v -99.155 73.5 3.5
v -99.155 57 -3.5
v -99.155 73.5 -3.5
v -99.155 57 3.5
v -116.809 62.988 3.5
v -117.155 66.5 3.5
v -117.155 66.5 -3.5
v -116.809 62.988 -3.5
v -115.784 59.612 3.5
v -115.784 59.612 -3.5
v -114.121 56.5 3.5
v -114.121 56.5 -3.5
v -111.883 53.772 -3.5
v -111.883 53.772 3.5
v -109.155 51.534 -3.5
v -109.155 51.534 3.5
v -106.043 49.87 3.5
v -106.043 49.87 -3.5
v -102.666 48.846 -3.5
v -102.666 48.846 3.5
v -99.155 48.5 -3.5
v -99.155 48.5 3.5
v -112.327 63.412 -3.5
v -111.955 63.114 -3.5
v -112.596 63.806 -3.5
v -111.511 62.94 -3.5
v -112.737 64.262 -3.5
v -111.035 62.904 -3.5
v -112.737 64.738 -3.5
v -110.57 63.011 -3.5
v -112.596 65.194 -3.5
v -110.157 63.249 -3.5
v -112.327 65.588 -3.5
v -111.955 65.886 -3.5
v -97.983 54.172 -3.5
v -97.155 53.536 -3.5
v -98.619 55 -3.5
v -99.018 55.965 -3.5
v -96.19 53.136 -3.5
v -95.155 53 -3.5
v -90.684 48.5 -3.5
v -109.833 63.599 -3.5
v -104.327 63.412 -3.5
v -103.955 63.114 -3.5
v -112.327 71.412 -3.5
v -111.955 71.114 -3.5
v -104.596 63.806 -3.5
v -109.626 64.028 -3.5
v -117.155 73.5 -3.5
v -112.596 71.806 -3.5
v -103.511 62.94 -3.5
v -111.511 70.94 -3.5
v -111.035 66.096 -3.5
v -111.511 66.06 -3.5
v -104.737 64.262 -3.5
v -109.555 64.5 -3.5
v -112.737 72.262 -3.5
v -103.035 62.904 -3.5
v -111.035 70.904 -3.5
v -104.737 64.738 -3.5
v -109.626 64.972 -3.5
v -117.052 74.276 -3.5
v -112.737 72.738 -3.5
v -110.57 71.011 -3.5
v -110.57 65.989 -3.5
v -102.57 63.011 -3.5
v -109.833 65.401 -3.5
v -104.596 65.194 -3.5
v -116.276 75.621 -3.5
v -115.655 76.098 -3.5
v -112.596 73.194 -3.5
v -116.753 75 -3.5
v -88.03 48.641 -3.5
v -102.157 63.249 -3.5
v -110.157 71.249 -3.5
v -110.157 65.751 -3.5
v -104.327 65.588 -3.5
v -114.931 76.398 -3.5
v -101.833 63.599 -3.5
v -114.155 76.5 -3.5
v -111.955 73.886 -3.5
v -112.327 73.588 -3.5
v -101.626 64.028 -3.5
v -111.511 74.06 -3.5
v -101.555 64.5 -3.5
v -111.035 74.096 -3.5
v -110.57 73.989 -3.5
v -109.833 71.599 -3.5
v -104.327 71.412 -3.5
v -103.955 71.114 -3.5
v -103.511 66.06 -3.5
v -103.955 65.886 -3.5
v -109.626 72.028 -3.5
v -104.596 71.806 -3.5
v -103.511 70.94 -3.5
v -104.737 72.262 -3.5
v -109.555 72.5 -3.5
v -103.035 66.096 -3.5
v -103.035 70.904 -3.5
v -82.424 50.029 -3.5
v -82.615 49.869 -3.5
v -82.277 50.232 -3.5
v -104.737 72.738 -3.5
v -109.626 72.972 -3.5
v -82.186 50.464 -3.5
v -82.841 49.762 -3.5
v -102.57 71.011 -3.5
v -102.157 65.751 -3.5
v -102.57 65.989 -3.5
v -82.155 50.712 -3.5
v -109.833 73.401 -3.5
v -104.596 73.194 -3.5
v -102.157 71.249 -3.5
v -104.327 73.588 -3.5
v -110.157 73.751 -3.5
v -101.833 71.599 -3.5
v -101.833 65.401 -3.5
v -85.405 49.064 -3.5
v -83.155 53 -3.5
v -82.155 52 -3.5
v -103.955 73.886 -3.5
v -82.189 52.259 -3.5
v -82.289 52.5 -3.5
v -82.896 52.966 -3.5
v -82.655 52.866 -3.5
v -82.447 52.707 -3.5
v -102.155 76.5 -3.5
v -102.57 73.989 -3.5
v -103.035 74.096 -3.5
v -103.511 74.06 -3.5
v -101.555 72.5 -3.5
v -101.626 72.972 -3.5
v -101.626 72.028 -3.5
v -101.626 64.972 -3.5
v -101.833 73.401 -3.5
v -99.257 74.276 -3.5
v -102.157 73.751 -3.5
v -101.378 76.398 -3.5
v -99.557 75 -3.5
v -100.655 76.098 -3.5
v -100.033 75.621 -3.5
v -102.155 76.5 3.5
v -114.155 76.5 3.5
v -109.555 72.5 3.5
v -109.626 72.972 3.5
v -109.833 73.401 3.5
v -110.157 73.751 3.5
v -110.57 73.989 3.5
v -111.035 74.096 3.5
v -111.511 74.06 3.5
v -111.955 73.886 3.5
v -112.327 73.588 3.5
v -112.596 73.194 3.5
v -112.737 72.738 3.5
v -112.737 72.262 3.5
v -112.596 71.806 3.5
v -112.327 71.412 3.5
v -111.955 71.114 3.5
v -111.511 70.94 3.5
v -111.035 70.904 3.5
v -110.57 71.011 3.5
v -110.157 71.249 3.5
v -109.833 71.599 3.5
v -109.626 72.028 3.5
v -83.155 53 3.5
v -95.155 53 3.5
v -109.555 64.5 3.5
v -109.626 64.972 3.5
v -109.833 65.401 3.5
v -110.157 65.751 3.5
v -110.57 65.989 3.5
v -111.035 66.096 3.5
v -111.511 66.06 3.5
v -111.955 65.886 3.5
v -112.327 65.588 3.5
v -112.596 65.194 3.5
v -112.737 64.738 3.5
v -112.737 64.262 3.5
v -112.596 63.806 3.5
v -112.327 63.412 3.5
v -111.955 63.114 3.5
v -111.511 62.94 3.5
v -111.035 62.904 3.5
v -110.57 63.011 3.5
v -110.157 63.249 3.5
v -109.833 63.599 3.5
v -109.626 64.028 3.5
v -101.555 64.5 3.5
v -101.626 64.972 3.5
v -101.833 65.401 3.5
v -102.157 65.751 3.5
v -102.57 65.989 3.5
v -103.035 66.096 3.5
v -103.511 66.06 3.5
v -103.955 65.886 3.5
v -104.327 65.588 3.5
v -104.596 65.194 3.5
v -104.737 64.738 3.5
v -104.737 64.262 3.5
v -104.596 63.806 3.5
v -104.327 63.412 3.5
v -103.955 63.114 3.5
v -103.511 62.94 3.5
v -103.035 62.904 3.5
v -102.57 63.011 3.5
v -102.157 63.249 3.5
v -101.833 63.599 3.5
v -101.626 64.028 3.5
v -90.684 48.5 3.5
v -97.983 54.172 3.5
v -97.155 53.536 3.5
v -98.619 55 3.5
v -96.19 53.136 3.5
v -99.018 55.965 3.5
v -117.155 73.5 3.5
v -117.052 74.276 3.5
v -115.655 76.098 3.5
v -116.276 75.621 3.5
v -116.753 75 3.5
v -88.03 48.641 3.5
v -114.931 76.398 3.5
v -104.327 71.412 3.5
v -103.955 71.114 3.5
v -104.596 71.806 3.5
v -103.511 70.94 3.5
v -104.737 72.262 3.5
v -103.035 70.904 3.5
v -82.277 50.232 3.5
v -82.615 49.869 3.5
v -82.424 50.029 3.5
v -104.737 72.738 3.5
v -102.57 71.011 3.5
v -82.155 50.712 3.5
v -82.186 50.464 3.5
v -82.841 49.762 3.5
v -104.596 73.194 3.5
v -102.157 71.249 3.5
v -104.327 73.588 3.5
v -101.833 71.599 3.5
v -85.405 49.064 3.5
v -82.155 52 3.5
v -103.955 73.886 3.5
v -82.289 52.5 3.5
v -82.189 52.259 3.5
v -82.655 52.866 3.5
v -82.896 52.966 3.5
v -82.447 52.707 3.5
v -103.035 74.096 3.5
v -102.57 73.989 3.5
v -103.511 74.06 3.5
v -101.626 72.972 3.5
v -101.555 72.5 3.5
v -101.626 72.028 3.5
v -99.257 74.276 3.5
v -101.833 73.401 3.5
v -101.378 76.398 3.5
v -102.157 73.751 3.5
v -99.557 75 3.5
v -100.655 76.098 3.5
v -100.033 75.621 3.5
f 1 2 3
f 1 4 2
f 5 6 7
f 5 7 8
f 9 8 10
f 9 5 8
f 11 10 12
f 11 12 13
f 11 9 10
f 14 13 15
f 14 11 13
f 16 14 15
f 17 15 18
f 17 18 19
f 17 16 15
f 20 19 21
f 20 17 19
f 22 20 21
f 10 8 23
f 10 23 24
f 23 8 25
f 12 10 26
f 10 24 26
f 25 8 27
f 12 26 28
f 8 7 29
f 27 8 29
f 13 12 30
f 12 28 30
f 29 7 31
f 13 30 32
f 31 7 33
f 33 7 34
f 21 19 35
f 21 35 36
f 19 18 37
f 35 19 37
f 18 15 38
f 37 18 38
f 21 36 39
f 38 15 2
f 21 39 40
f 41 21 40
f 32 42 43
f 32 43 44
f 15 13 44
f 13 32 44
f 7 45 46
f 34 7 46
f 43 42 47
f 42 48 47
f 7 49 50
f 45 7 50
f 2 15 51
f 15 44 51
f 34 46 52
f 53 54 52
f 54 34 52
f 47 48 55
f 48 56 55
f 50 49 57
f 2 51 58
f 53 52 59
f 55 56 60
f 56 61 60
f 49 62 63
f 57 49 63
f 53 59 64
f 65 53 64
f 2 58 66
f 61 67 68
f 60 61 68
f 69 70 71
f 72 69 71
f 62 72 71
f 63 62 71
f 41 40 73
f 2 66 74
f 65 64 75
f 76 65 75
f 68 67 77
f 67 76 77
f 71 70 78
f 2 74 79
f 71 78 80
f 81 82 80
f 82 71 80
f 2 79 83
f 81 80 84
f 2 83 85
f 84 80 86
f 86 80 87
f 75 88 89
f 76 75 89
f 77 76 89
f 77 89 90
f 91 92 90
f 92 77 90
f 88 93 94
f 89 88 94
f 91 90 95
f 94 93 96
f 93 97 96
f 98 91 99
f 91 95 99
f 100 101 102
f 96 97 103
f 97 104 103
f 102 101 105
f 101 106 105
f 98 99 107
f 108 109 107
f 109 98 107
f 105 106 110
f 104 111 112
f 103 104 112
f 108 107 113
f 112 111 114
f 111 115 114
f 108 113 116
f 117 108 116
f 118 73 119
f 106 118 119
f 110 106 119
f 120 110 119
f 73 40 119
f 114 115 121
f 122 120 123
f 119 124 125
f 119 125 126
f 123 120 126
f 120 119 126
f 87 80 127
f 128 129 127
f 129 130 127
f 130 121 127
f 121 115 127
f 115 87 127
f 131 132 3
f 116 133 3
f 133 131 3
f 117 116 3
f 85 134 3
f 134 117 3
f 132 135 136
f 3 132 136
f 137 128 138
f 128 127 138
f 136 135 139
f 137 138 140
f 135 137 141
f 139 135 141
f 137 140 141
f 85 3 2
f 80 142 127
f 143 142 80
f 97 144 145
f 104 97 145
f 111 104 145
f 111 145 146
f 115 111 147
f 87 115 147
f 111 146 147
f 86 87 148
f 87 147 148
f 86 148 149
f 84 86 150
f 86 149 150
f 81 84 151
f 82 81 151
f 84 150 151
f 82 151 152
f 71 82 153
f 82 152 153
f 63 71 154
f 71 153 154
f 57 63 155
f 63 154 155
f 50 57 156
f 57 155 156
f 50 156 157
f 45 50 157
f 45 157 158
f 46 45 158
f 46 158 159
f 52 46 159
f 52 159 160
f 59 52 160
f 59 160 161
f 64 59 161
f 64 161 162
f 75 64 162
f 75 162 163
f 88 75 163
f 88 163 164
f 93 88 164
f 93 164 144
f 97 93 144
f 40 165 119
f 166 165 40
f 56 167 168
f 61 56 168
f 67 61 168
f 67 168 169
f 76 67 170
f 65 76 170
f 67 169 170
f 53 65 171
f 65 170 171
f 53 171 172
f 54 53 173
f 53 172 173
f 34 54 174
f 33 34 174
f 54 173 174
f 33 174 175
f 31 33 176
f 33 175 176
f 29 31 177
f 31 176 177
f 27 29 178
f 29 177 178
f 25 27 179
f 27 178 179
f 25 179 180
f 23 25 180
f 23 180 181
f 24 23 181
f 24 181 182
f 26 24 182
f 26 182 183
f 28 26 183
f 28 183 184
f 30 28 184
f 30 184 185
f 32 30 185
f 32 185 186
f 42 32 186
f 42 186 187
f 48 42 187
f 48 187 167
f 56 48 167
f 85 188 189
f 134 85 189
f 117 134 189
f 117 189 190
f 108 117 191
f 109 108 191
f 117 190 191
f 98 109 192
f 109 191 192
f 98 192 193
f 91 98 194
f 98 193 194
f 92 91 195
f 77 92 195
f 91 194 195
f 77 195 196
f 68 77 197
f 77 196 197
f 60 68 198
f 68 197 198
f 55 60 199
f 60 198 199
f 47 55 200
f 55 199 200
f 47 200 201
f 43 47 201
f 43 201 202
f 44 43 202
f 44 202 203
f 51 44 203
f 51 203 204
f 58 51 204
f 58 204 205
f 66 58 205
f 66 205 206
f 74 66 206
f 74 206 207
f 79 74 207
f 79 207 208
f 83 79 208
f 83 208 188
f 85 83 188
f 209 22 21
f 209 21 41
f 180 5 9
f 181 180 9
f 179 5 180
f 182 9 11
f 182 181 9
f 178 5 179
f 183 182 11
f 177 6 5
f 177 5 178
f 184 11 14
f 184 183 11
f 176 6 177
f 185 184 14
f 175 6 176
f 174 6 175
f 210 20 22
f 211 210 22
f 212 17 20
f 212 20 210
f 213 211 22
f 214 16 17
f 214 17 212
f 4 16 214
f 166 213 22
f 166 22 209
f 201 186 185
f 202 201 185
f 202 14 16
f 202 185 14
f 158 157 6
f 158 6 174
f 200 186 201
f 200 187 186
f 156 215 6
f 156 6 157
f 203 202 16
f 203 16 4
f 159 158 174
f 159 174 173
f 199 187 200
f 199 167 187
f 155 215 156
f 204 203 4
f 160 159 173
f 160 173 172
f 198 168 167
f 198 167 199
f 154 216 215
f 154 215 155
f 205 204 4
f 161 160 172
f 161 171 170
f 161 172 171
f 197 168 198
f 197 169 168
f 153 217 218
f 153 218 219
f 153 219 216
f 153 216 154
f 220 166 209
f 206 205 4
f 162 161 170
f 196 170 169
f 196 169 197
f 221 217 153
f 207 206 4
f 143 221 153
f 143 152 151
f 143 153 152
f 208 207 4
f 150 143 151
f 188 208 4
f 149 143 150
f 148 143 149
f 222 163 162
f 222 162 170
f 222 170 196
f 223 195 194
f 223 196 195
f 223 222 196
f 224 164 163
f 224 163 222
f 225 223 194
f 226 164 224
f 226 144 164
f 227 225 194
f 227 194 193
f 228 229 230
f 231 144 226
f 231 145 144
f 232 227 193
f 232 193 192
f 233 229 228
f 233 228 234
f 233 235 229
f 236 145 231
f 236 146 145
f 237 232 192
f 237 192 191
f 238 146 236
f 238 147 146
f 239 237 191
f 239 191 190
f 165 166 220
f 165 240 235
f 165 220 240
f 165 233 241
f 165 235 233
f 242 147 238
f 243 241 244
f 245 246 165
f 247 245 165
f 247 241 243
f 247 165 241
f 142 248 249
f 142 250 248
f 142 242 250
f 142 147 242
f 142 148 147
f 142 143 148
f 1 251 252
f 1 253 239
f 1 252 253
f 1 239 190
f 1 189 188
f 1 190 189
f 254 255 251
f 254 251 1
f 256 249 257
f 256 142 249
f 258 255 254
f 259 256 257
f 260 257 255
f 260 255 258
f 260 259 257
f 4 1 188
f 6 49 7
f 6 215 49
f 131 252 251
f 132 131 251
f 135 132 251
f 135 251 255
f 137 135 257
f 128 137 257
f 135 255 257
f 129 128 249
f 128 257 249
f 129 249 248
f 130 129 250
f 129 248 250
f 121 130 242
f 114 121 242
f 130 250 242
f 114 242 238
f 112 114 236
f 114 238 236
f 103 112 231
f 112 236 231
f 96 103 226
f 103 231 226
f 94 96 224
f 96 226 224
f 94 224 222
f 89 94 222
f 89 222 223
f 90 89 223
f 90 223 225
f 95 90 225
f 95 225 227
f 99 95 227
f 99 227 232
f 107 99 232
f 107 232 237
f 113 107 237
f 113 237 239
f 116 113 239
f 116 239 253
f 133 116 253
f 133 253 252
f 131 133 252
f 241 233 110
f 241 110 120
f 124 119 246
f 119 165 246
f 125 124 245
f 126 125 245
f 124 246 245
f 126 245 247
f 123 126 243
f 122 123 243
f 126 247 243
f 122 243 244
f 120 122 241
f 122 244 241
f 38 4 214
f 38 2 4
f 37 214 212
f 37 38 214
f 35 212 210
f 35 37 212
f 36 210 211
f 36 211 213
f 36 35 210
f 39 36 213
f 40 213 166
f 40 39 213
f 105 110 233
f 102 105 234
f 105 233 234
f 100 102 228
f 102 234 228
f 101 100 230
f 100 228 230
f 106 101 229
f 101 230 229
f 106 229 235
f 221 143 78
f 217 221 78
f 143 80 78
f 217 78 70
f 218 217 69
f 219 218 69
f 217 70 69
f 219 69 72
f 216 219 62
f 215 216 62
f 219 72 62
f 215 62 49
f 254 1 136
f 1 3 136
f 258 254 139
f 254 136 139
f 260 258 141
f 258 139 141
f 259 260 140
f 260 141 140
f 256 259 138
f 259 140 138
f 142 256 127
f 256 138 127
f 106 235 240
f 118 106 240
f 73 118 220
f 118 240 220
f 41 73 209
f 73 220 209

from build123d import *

# Parameters (mm, degrees)
EXTRUDE_1_DEPTH     = 3.5
SKETCH_3_R          = 1.6
CUT_EXTRUDE_1_DEPTH = 16
CUT_EXTRUDE_2_DEPTH = 13
FILLET_1_R          = 1
FILLET_2_R          = 3
FILLET_3_R          = 4


with BuildPart() as part:
    # 草图2 → 凸台-拉伸1 (new, symmetric)
    with BuildSketch(Plane.XY):
        with BuildLine():
            Line((-117.154590294, 76.5), (-117.154590294, 66.5))
            ThreePointArc((-117.154590294, 66.5), (-111.882512356, 53.772077939), (-99.154590294, 48.5))
            Line((-99.154590294, 48.5), (-82.154590294, 48.5))
            Line((-82.154590294, 48.5), (-82.154590294, 53))
            Line((-82.154590294, 53), (-99.154590294, 53))
            Line((-99.154590294, 53), (-99.154590294, 76.5))
            Line((-99.154590294, 76.5), (-117.154590294, 76.5))
        make_face()
    extrude(amount=EXTRUDE_1_DEPTH, both=True)

    # 草图3 → 切除-拉伸1 (cut)
    with BuildSketch(Plane.XY.offset(3.5)):
        with Locations((-103.154590294, 72.5)):
            Circle(SKETCH_3_R)
        with Locations((-111.154590294, 72.5)):
            Circle(SKETCH_3_R)
        with Locations((-111.154590294, 64.5)):
            Circle(SKETCH_3_R)
        with Locations((-103.154590294, 64.5)):
            Circle(SKETCH_3_R)
    extrude(amount=-CUT_EXTRUDE_1_DEPTH, mode=Mode.SUBTRACT)

    # 草图4 → 切除-拉伸2 (cut)
    with BuildSketch(Plane.XY.offset(3.5)):
        with BuildLine():
            Line((-90.683951349, 48.5), (-90.683951349, 46.627419574))
            Line((-90.683951349, 46.627419574), (-65.683951349, 46.627419574))
            Line((-65.683951349, 46.627419574), (-65.683951349, 73.5))
            ThreePointArc((-65.683951349, 73.5), (-73.006281819, 55.82233047), (-90.683951349, 48.5))
        make_face()
    extrude(amount=-CUT_EXTRUDE_2_DEPTH, mode=Mode.SUBTRACT)

    # 圆角1
    fillet_1_edges = [part.edges().sort_by_distance(p)[0] for p in [
        (-82.154590294, 53, 0),
        (-82.154590294, 50, 0),
    ]]
    fillet(fillet_1_edges, radius=FILLET_1_R)

    # 圆角2
    fillet_2_edges = [part.edges().sort_by_distance(p)[0] for p in [
        (-117.154590294, 76.5, 0),
        (-99.154590294, 76.5, 0),
    ]]
    fillet(fillet_2_edges, radius=FILLET_2_R)

    # 圆角3
    fillet_3_edges = [part.edges().sort_by_distance(p)[0] for p in [
        (-99.154590294, 53, 0),
    ]]
    fillet(fillet_3_edges, radius=FILLET_3_R)


solid = part.part
